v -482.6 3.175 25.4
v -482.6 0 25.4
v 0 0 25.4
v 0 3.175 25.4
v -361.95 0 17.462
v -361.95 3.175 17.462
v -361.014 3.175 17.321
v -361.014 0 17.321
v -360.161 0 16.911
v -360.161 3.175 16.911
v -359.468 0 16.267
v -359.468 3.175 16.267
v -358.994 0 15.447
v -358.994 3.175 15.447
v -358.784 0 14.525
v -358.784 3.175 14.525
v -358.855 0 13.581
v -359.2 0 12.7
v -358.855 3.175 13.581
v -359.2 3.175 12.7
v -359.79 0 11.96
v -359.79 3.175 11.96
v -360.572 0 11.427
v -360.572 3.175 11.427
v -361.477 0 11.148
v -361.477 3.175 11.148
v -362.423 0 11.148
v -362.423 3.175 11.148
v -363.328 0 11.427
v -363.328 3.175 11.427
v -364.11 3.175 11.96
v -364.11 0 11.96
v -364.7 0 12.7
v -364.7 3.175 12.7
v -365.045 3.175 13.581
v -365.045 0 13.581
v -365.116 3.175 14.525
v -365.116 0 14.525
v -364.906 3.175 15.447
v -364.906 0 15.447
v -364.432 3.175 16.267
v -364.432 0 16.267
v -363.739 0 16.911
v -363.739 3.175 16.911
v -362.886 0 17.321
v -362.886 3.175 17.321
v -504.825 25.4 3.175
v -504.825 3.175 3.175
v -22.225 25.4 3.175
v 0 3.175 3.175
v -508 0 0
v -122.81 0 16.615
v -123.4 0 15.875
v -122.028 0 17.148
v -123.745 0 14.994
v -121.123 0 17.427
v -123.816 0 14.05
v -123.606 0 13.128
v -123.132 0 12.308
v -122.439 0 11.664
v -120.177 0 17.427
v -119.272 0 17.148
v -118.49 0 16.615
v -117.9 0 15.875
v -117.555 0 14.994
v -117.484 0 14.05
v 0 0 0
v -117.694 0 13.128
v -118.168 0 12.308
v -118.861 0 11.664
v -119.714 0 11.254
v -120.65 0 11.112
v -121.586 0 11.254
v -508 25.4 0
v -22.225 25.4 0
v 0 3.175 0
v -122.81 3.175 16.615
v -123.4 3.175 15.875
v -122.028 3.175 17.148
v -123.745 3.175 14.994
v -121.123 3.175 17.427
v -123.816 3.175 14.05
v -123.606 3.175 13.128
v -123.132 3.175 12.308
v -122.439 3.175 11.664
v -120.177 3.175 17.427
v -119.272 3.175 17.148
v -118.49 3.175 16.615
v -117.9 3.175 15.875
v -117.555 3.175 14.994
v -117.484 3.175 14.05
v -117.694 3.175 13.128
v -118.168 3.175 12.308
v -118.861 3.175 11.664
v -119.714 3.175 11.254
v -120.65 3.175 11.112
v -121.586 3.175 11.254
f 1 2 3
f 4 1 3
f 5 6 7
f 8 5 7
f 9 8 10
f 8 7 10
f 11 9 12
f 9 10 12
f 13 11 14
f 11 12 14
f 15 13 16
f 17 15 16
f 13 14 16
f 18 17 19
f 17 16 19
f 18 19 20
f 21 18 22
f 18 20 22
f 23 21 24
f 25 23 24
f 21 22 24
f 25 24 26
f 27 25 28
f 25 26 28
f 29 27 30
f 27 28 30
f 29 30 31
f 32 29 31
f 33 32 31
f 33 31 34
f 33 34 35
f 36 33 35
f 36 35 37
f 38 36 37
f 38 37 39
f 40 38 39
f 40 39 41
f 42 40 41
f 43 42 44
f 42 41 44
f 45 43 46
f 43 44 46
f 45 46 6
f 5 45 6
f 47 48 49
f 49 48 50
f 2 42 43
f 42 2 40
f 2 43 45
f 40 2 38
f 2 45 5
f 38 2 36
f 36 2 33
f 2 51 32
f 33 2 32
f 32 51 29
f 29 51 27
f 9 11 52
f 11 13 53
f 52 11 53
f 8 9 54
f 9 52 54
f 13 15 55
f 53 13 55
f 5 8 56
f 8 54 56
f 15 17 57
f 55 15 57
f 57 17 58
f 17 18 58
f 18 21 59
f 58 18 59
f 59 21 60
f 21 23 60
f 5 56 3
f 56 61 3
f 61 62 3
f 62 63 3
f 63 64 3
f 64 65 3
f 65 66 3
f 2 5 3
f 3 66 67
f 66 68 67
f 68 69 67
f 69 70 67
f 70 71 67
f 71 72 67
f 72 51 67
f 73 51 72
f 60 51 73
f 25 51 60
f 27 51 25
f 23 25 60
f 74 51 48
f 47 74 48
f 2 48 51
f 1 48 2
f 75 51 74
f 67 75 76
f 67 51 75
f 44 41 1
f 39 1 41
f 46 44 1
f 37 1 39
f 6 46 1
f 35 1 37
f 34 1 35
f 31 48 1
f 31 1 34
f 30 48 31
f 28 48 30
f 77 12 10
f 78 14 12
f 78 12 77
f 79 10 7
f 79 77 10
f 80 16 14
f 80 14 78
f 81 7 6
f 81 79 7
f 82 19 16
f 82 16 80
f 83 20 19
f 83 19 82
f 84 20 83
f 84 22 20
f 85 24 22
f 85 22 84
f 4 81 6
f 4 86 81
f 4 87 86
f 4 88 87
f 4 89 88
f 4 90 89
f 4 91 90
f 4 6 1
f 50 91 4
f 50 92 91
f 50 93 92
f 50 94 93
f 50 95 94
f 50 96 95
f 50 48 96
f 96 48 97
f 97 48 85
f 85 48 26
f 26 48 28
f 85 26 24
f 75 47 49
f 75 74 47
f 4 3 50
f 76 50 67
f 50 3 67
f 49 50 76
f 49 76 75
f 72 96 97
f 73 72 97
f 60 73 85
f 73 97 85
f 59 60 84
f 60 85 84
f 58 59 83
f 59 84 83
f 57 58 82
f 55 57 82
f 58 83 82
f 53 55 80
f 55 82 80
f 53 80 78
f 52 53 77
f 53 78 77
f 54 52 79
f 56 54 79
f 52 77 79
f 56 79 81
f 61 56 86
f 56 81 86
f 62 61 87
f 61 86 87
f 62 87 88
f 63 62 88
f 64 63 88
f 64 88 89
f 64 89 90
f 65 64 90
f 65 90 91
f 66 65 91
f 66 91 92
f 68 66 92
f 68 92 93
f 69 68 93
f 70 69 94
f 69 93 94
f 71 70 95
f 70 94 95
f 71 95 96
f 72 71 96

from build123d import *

# Parameters (mm, degrees)
SKETCH1_W           = 508
SKETCH1_H           = 25.4
BOSS_EXTRUDE1_DEPTH = 3.175
SKETCH2_W           = 508
SKETCH2_H           = 3.175
BOSS_EXTRUDE2_DEPTH = 22.225
CUT_EXTRUDE4_REACH  = 511.268
CUT_EXTRUDE5_DEPTH  = 22.225
SKETCH9_R           = 3.175
CUT_EXTRUDE6_DEPTH  = 3.175


with BuildPart() as part:
    # Sketch1 → Boss-Extrude1 (new body)
    with BuildSketch(Plane(origin=(0, 0, 0), x_dir=(1, 0, 0), z_dir=(0, 1, 0))):
        with Locations((-254, -12.7)):
            Rectangle(SKETCH1_W, SKETCH1_H)
    extrude(amount=BOSS_EXTRUDE1_DEPTH)

    # Sketch2 → Boss-Extrude2 (add)
    with BuildSketch(Plane(origin=(0, 3.175, 0), x_dir=(1, 0, 0), z_dir=(0, 1, 0))):
        with Locations((-254, -1.5875)):
            Rectangle(SKETCH2_W, SKETCH2_H)
    extrude(amount=BOSS_EXTRUDE2_DEPTH)

    # Cut-Extrude4: up to this face of the body (flat: up to its plane)
    cut_extrude4_end = Plane(part.part.faces().sort_by_distance((-254, 0, 12.7))[0])
    # Sketch7 → Cut-Extrude4 (cut, up to the picked face)
    with BuildSketch(Plane(origin=(0, 25.4, 0), x_dir=(1, 0, 0), z_dir=(0, 1, 0)), mode=Mode.PRIVATE) as cut_extrude4_sk1:
        Polygon((-508, 0), (-465.114238784, -42.885761216), (-525.028652123, -42.885761216), align=None)
    cut_extrude4_tool1 = split(extrude(cut_extrude4_sk1.sketch, amount=-CUT_EXTRUDE4_REACH, mode=Mode.PRIVATE), bisect_by=cut_extrude4_end, keep=Keep.BOTH, mode=Mode.PRIVATE)
    add(cut_extrude4_tool1.solids().sort_by(Axis((-499.380964, 25.4, 28.590507), (0, -1, 0)))[0], mode=Mode.SUBTRACT)

    # Sketch8 → Cut-Extrude5 (cut)
    with BuildSketch(Plane.XY.offset(3.175)):
        Polygon((0, 3.175), (-40.651364309, 43.826364309), (40.603016419, 27.12928401), align=None)
    extrude(amount=-CUT_EXTRUDE5_DEPTH, mode=Mode.SUBTRACT)

    # Sketch9 → Cut-Extrude6 (cut)
    with BuildSketch(Plane(origin=(0, 3.175, 0), x_dir=(1, 0, 0), z_dir=(0, 1, 0))):
        with Locations(Location((-361.95, -14.2875, 0), (0, 0, 270))):
            Circle(SKETCH9_R)
        with Locations(Location((-120.65, -14.2875, 0), (0, 0, 90))):
            Circle(SKETCH9_R)
    extrude(amount=-CUT_EXTRUDE6_DEPTH, mode=Mode.SUBTRACT)


solid = part.part
